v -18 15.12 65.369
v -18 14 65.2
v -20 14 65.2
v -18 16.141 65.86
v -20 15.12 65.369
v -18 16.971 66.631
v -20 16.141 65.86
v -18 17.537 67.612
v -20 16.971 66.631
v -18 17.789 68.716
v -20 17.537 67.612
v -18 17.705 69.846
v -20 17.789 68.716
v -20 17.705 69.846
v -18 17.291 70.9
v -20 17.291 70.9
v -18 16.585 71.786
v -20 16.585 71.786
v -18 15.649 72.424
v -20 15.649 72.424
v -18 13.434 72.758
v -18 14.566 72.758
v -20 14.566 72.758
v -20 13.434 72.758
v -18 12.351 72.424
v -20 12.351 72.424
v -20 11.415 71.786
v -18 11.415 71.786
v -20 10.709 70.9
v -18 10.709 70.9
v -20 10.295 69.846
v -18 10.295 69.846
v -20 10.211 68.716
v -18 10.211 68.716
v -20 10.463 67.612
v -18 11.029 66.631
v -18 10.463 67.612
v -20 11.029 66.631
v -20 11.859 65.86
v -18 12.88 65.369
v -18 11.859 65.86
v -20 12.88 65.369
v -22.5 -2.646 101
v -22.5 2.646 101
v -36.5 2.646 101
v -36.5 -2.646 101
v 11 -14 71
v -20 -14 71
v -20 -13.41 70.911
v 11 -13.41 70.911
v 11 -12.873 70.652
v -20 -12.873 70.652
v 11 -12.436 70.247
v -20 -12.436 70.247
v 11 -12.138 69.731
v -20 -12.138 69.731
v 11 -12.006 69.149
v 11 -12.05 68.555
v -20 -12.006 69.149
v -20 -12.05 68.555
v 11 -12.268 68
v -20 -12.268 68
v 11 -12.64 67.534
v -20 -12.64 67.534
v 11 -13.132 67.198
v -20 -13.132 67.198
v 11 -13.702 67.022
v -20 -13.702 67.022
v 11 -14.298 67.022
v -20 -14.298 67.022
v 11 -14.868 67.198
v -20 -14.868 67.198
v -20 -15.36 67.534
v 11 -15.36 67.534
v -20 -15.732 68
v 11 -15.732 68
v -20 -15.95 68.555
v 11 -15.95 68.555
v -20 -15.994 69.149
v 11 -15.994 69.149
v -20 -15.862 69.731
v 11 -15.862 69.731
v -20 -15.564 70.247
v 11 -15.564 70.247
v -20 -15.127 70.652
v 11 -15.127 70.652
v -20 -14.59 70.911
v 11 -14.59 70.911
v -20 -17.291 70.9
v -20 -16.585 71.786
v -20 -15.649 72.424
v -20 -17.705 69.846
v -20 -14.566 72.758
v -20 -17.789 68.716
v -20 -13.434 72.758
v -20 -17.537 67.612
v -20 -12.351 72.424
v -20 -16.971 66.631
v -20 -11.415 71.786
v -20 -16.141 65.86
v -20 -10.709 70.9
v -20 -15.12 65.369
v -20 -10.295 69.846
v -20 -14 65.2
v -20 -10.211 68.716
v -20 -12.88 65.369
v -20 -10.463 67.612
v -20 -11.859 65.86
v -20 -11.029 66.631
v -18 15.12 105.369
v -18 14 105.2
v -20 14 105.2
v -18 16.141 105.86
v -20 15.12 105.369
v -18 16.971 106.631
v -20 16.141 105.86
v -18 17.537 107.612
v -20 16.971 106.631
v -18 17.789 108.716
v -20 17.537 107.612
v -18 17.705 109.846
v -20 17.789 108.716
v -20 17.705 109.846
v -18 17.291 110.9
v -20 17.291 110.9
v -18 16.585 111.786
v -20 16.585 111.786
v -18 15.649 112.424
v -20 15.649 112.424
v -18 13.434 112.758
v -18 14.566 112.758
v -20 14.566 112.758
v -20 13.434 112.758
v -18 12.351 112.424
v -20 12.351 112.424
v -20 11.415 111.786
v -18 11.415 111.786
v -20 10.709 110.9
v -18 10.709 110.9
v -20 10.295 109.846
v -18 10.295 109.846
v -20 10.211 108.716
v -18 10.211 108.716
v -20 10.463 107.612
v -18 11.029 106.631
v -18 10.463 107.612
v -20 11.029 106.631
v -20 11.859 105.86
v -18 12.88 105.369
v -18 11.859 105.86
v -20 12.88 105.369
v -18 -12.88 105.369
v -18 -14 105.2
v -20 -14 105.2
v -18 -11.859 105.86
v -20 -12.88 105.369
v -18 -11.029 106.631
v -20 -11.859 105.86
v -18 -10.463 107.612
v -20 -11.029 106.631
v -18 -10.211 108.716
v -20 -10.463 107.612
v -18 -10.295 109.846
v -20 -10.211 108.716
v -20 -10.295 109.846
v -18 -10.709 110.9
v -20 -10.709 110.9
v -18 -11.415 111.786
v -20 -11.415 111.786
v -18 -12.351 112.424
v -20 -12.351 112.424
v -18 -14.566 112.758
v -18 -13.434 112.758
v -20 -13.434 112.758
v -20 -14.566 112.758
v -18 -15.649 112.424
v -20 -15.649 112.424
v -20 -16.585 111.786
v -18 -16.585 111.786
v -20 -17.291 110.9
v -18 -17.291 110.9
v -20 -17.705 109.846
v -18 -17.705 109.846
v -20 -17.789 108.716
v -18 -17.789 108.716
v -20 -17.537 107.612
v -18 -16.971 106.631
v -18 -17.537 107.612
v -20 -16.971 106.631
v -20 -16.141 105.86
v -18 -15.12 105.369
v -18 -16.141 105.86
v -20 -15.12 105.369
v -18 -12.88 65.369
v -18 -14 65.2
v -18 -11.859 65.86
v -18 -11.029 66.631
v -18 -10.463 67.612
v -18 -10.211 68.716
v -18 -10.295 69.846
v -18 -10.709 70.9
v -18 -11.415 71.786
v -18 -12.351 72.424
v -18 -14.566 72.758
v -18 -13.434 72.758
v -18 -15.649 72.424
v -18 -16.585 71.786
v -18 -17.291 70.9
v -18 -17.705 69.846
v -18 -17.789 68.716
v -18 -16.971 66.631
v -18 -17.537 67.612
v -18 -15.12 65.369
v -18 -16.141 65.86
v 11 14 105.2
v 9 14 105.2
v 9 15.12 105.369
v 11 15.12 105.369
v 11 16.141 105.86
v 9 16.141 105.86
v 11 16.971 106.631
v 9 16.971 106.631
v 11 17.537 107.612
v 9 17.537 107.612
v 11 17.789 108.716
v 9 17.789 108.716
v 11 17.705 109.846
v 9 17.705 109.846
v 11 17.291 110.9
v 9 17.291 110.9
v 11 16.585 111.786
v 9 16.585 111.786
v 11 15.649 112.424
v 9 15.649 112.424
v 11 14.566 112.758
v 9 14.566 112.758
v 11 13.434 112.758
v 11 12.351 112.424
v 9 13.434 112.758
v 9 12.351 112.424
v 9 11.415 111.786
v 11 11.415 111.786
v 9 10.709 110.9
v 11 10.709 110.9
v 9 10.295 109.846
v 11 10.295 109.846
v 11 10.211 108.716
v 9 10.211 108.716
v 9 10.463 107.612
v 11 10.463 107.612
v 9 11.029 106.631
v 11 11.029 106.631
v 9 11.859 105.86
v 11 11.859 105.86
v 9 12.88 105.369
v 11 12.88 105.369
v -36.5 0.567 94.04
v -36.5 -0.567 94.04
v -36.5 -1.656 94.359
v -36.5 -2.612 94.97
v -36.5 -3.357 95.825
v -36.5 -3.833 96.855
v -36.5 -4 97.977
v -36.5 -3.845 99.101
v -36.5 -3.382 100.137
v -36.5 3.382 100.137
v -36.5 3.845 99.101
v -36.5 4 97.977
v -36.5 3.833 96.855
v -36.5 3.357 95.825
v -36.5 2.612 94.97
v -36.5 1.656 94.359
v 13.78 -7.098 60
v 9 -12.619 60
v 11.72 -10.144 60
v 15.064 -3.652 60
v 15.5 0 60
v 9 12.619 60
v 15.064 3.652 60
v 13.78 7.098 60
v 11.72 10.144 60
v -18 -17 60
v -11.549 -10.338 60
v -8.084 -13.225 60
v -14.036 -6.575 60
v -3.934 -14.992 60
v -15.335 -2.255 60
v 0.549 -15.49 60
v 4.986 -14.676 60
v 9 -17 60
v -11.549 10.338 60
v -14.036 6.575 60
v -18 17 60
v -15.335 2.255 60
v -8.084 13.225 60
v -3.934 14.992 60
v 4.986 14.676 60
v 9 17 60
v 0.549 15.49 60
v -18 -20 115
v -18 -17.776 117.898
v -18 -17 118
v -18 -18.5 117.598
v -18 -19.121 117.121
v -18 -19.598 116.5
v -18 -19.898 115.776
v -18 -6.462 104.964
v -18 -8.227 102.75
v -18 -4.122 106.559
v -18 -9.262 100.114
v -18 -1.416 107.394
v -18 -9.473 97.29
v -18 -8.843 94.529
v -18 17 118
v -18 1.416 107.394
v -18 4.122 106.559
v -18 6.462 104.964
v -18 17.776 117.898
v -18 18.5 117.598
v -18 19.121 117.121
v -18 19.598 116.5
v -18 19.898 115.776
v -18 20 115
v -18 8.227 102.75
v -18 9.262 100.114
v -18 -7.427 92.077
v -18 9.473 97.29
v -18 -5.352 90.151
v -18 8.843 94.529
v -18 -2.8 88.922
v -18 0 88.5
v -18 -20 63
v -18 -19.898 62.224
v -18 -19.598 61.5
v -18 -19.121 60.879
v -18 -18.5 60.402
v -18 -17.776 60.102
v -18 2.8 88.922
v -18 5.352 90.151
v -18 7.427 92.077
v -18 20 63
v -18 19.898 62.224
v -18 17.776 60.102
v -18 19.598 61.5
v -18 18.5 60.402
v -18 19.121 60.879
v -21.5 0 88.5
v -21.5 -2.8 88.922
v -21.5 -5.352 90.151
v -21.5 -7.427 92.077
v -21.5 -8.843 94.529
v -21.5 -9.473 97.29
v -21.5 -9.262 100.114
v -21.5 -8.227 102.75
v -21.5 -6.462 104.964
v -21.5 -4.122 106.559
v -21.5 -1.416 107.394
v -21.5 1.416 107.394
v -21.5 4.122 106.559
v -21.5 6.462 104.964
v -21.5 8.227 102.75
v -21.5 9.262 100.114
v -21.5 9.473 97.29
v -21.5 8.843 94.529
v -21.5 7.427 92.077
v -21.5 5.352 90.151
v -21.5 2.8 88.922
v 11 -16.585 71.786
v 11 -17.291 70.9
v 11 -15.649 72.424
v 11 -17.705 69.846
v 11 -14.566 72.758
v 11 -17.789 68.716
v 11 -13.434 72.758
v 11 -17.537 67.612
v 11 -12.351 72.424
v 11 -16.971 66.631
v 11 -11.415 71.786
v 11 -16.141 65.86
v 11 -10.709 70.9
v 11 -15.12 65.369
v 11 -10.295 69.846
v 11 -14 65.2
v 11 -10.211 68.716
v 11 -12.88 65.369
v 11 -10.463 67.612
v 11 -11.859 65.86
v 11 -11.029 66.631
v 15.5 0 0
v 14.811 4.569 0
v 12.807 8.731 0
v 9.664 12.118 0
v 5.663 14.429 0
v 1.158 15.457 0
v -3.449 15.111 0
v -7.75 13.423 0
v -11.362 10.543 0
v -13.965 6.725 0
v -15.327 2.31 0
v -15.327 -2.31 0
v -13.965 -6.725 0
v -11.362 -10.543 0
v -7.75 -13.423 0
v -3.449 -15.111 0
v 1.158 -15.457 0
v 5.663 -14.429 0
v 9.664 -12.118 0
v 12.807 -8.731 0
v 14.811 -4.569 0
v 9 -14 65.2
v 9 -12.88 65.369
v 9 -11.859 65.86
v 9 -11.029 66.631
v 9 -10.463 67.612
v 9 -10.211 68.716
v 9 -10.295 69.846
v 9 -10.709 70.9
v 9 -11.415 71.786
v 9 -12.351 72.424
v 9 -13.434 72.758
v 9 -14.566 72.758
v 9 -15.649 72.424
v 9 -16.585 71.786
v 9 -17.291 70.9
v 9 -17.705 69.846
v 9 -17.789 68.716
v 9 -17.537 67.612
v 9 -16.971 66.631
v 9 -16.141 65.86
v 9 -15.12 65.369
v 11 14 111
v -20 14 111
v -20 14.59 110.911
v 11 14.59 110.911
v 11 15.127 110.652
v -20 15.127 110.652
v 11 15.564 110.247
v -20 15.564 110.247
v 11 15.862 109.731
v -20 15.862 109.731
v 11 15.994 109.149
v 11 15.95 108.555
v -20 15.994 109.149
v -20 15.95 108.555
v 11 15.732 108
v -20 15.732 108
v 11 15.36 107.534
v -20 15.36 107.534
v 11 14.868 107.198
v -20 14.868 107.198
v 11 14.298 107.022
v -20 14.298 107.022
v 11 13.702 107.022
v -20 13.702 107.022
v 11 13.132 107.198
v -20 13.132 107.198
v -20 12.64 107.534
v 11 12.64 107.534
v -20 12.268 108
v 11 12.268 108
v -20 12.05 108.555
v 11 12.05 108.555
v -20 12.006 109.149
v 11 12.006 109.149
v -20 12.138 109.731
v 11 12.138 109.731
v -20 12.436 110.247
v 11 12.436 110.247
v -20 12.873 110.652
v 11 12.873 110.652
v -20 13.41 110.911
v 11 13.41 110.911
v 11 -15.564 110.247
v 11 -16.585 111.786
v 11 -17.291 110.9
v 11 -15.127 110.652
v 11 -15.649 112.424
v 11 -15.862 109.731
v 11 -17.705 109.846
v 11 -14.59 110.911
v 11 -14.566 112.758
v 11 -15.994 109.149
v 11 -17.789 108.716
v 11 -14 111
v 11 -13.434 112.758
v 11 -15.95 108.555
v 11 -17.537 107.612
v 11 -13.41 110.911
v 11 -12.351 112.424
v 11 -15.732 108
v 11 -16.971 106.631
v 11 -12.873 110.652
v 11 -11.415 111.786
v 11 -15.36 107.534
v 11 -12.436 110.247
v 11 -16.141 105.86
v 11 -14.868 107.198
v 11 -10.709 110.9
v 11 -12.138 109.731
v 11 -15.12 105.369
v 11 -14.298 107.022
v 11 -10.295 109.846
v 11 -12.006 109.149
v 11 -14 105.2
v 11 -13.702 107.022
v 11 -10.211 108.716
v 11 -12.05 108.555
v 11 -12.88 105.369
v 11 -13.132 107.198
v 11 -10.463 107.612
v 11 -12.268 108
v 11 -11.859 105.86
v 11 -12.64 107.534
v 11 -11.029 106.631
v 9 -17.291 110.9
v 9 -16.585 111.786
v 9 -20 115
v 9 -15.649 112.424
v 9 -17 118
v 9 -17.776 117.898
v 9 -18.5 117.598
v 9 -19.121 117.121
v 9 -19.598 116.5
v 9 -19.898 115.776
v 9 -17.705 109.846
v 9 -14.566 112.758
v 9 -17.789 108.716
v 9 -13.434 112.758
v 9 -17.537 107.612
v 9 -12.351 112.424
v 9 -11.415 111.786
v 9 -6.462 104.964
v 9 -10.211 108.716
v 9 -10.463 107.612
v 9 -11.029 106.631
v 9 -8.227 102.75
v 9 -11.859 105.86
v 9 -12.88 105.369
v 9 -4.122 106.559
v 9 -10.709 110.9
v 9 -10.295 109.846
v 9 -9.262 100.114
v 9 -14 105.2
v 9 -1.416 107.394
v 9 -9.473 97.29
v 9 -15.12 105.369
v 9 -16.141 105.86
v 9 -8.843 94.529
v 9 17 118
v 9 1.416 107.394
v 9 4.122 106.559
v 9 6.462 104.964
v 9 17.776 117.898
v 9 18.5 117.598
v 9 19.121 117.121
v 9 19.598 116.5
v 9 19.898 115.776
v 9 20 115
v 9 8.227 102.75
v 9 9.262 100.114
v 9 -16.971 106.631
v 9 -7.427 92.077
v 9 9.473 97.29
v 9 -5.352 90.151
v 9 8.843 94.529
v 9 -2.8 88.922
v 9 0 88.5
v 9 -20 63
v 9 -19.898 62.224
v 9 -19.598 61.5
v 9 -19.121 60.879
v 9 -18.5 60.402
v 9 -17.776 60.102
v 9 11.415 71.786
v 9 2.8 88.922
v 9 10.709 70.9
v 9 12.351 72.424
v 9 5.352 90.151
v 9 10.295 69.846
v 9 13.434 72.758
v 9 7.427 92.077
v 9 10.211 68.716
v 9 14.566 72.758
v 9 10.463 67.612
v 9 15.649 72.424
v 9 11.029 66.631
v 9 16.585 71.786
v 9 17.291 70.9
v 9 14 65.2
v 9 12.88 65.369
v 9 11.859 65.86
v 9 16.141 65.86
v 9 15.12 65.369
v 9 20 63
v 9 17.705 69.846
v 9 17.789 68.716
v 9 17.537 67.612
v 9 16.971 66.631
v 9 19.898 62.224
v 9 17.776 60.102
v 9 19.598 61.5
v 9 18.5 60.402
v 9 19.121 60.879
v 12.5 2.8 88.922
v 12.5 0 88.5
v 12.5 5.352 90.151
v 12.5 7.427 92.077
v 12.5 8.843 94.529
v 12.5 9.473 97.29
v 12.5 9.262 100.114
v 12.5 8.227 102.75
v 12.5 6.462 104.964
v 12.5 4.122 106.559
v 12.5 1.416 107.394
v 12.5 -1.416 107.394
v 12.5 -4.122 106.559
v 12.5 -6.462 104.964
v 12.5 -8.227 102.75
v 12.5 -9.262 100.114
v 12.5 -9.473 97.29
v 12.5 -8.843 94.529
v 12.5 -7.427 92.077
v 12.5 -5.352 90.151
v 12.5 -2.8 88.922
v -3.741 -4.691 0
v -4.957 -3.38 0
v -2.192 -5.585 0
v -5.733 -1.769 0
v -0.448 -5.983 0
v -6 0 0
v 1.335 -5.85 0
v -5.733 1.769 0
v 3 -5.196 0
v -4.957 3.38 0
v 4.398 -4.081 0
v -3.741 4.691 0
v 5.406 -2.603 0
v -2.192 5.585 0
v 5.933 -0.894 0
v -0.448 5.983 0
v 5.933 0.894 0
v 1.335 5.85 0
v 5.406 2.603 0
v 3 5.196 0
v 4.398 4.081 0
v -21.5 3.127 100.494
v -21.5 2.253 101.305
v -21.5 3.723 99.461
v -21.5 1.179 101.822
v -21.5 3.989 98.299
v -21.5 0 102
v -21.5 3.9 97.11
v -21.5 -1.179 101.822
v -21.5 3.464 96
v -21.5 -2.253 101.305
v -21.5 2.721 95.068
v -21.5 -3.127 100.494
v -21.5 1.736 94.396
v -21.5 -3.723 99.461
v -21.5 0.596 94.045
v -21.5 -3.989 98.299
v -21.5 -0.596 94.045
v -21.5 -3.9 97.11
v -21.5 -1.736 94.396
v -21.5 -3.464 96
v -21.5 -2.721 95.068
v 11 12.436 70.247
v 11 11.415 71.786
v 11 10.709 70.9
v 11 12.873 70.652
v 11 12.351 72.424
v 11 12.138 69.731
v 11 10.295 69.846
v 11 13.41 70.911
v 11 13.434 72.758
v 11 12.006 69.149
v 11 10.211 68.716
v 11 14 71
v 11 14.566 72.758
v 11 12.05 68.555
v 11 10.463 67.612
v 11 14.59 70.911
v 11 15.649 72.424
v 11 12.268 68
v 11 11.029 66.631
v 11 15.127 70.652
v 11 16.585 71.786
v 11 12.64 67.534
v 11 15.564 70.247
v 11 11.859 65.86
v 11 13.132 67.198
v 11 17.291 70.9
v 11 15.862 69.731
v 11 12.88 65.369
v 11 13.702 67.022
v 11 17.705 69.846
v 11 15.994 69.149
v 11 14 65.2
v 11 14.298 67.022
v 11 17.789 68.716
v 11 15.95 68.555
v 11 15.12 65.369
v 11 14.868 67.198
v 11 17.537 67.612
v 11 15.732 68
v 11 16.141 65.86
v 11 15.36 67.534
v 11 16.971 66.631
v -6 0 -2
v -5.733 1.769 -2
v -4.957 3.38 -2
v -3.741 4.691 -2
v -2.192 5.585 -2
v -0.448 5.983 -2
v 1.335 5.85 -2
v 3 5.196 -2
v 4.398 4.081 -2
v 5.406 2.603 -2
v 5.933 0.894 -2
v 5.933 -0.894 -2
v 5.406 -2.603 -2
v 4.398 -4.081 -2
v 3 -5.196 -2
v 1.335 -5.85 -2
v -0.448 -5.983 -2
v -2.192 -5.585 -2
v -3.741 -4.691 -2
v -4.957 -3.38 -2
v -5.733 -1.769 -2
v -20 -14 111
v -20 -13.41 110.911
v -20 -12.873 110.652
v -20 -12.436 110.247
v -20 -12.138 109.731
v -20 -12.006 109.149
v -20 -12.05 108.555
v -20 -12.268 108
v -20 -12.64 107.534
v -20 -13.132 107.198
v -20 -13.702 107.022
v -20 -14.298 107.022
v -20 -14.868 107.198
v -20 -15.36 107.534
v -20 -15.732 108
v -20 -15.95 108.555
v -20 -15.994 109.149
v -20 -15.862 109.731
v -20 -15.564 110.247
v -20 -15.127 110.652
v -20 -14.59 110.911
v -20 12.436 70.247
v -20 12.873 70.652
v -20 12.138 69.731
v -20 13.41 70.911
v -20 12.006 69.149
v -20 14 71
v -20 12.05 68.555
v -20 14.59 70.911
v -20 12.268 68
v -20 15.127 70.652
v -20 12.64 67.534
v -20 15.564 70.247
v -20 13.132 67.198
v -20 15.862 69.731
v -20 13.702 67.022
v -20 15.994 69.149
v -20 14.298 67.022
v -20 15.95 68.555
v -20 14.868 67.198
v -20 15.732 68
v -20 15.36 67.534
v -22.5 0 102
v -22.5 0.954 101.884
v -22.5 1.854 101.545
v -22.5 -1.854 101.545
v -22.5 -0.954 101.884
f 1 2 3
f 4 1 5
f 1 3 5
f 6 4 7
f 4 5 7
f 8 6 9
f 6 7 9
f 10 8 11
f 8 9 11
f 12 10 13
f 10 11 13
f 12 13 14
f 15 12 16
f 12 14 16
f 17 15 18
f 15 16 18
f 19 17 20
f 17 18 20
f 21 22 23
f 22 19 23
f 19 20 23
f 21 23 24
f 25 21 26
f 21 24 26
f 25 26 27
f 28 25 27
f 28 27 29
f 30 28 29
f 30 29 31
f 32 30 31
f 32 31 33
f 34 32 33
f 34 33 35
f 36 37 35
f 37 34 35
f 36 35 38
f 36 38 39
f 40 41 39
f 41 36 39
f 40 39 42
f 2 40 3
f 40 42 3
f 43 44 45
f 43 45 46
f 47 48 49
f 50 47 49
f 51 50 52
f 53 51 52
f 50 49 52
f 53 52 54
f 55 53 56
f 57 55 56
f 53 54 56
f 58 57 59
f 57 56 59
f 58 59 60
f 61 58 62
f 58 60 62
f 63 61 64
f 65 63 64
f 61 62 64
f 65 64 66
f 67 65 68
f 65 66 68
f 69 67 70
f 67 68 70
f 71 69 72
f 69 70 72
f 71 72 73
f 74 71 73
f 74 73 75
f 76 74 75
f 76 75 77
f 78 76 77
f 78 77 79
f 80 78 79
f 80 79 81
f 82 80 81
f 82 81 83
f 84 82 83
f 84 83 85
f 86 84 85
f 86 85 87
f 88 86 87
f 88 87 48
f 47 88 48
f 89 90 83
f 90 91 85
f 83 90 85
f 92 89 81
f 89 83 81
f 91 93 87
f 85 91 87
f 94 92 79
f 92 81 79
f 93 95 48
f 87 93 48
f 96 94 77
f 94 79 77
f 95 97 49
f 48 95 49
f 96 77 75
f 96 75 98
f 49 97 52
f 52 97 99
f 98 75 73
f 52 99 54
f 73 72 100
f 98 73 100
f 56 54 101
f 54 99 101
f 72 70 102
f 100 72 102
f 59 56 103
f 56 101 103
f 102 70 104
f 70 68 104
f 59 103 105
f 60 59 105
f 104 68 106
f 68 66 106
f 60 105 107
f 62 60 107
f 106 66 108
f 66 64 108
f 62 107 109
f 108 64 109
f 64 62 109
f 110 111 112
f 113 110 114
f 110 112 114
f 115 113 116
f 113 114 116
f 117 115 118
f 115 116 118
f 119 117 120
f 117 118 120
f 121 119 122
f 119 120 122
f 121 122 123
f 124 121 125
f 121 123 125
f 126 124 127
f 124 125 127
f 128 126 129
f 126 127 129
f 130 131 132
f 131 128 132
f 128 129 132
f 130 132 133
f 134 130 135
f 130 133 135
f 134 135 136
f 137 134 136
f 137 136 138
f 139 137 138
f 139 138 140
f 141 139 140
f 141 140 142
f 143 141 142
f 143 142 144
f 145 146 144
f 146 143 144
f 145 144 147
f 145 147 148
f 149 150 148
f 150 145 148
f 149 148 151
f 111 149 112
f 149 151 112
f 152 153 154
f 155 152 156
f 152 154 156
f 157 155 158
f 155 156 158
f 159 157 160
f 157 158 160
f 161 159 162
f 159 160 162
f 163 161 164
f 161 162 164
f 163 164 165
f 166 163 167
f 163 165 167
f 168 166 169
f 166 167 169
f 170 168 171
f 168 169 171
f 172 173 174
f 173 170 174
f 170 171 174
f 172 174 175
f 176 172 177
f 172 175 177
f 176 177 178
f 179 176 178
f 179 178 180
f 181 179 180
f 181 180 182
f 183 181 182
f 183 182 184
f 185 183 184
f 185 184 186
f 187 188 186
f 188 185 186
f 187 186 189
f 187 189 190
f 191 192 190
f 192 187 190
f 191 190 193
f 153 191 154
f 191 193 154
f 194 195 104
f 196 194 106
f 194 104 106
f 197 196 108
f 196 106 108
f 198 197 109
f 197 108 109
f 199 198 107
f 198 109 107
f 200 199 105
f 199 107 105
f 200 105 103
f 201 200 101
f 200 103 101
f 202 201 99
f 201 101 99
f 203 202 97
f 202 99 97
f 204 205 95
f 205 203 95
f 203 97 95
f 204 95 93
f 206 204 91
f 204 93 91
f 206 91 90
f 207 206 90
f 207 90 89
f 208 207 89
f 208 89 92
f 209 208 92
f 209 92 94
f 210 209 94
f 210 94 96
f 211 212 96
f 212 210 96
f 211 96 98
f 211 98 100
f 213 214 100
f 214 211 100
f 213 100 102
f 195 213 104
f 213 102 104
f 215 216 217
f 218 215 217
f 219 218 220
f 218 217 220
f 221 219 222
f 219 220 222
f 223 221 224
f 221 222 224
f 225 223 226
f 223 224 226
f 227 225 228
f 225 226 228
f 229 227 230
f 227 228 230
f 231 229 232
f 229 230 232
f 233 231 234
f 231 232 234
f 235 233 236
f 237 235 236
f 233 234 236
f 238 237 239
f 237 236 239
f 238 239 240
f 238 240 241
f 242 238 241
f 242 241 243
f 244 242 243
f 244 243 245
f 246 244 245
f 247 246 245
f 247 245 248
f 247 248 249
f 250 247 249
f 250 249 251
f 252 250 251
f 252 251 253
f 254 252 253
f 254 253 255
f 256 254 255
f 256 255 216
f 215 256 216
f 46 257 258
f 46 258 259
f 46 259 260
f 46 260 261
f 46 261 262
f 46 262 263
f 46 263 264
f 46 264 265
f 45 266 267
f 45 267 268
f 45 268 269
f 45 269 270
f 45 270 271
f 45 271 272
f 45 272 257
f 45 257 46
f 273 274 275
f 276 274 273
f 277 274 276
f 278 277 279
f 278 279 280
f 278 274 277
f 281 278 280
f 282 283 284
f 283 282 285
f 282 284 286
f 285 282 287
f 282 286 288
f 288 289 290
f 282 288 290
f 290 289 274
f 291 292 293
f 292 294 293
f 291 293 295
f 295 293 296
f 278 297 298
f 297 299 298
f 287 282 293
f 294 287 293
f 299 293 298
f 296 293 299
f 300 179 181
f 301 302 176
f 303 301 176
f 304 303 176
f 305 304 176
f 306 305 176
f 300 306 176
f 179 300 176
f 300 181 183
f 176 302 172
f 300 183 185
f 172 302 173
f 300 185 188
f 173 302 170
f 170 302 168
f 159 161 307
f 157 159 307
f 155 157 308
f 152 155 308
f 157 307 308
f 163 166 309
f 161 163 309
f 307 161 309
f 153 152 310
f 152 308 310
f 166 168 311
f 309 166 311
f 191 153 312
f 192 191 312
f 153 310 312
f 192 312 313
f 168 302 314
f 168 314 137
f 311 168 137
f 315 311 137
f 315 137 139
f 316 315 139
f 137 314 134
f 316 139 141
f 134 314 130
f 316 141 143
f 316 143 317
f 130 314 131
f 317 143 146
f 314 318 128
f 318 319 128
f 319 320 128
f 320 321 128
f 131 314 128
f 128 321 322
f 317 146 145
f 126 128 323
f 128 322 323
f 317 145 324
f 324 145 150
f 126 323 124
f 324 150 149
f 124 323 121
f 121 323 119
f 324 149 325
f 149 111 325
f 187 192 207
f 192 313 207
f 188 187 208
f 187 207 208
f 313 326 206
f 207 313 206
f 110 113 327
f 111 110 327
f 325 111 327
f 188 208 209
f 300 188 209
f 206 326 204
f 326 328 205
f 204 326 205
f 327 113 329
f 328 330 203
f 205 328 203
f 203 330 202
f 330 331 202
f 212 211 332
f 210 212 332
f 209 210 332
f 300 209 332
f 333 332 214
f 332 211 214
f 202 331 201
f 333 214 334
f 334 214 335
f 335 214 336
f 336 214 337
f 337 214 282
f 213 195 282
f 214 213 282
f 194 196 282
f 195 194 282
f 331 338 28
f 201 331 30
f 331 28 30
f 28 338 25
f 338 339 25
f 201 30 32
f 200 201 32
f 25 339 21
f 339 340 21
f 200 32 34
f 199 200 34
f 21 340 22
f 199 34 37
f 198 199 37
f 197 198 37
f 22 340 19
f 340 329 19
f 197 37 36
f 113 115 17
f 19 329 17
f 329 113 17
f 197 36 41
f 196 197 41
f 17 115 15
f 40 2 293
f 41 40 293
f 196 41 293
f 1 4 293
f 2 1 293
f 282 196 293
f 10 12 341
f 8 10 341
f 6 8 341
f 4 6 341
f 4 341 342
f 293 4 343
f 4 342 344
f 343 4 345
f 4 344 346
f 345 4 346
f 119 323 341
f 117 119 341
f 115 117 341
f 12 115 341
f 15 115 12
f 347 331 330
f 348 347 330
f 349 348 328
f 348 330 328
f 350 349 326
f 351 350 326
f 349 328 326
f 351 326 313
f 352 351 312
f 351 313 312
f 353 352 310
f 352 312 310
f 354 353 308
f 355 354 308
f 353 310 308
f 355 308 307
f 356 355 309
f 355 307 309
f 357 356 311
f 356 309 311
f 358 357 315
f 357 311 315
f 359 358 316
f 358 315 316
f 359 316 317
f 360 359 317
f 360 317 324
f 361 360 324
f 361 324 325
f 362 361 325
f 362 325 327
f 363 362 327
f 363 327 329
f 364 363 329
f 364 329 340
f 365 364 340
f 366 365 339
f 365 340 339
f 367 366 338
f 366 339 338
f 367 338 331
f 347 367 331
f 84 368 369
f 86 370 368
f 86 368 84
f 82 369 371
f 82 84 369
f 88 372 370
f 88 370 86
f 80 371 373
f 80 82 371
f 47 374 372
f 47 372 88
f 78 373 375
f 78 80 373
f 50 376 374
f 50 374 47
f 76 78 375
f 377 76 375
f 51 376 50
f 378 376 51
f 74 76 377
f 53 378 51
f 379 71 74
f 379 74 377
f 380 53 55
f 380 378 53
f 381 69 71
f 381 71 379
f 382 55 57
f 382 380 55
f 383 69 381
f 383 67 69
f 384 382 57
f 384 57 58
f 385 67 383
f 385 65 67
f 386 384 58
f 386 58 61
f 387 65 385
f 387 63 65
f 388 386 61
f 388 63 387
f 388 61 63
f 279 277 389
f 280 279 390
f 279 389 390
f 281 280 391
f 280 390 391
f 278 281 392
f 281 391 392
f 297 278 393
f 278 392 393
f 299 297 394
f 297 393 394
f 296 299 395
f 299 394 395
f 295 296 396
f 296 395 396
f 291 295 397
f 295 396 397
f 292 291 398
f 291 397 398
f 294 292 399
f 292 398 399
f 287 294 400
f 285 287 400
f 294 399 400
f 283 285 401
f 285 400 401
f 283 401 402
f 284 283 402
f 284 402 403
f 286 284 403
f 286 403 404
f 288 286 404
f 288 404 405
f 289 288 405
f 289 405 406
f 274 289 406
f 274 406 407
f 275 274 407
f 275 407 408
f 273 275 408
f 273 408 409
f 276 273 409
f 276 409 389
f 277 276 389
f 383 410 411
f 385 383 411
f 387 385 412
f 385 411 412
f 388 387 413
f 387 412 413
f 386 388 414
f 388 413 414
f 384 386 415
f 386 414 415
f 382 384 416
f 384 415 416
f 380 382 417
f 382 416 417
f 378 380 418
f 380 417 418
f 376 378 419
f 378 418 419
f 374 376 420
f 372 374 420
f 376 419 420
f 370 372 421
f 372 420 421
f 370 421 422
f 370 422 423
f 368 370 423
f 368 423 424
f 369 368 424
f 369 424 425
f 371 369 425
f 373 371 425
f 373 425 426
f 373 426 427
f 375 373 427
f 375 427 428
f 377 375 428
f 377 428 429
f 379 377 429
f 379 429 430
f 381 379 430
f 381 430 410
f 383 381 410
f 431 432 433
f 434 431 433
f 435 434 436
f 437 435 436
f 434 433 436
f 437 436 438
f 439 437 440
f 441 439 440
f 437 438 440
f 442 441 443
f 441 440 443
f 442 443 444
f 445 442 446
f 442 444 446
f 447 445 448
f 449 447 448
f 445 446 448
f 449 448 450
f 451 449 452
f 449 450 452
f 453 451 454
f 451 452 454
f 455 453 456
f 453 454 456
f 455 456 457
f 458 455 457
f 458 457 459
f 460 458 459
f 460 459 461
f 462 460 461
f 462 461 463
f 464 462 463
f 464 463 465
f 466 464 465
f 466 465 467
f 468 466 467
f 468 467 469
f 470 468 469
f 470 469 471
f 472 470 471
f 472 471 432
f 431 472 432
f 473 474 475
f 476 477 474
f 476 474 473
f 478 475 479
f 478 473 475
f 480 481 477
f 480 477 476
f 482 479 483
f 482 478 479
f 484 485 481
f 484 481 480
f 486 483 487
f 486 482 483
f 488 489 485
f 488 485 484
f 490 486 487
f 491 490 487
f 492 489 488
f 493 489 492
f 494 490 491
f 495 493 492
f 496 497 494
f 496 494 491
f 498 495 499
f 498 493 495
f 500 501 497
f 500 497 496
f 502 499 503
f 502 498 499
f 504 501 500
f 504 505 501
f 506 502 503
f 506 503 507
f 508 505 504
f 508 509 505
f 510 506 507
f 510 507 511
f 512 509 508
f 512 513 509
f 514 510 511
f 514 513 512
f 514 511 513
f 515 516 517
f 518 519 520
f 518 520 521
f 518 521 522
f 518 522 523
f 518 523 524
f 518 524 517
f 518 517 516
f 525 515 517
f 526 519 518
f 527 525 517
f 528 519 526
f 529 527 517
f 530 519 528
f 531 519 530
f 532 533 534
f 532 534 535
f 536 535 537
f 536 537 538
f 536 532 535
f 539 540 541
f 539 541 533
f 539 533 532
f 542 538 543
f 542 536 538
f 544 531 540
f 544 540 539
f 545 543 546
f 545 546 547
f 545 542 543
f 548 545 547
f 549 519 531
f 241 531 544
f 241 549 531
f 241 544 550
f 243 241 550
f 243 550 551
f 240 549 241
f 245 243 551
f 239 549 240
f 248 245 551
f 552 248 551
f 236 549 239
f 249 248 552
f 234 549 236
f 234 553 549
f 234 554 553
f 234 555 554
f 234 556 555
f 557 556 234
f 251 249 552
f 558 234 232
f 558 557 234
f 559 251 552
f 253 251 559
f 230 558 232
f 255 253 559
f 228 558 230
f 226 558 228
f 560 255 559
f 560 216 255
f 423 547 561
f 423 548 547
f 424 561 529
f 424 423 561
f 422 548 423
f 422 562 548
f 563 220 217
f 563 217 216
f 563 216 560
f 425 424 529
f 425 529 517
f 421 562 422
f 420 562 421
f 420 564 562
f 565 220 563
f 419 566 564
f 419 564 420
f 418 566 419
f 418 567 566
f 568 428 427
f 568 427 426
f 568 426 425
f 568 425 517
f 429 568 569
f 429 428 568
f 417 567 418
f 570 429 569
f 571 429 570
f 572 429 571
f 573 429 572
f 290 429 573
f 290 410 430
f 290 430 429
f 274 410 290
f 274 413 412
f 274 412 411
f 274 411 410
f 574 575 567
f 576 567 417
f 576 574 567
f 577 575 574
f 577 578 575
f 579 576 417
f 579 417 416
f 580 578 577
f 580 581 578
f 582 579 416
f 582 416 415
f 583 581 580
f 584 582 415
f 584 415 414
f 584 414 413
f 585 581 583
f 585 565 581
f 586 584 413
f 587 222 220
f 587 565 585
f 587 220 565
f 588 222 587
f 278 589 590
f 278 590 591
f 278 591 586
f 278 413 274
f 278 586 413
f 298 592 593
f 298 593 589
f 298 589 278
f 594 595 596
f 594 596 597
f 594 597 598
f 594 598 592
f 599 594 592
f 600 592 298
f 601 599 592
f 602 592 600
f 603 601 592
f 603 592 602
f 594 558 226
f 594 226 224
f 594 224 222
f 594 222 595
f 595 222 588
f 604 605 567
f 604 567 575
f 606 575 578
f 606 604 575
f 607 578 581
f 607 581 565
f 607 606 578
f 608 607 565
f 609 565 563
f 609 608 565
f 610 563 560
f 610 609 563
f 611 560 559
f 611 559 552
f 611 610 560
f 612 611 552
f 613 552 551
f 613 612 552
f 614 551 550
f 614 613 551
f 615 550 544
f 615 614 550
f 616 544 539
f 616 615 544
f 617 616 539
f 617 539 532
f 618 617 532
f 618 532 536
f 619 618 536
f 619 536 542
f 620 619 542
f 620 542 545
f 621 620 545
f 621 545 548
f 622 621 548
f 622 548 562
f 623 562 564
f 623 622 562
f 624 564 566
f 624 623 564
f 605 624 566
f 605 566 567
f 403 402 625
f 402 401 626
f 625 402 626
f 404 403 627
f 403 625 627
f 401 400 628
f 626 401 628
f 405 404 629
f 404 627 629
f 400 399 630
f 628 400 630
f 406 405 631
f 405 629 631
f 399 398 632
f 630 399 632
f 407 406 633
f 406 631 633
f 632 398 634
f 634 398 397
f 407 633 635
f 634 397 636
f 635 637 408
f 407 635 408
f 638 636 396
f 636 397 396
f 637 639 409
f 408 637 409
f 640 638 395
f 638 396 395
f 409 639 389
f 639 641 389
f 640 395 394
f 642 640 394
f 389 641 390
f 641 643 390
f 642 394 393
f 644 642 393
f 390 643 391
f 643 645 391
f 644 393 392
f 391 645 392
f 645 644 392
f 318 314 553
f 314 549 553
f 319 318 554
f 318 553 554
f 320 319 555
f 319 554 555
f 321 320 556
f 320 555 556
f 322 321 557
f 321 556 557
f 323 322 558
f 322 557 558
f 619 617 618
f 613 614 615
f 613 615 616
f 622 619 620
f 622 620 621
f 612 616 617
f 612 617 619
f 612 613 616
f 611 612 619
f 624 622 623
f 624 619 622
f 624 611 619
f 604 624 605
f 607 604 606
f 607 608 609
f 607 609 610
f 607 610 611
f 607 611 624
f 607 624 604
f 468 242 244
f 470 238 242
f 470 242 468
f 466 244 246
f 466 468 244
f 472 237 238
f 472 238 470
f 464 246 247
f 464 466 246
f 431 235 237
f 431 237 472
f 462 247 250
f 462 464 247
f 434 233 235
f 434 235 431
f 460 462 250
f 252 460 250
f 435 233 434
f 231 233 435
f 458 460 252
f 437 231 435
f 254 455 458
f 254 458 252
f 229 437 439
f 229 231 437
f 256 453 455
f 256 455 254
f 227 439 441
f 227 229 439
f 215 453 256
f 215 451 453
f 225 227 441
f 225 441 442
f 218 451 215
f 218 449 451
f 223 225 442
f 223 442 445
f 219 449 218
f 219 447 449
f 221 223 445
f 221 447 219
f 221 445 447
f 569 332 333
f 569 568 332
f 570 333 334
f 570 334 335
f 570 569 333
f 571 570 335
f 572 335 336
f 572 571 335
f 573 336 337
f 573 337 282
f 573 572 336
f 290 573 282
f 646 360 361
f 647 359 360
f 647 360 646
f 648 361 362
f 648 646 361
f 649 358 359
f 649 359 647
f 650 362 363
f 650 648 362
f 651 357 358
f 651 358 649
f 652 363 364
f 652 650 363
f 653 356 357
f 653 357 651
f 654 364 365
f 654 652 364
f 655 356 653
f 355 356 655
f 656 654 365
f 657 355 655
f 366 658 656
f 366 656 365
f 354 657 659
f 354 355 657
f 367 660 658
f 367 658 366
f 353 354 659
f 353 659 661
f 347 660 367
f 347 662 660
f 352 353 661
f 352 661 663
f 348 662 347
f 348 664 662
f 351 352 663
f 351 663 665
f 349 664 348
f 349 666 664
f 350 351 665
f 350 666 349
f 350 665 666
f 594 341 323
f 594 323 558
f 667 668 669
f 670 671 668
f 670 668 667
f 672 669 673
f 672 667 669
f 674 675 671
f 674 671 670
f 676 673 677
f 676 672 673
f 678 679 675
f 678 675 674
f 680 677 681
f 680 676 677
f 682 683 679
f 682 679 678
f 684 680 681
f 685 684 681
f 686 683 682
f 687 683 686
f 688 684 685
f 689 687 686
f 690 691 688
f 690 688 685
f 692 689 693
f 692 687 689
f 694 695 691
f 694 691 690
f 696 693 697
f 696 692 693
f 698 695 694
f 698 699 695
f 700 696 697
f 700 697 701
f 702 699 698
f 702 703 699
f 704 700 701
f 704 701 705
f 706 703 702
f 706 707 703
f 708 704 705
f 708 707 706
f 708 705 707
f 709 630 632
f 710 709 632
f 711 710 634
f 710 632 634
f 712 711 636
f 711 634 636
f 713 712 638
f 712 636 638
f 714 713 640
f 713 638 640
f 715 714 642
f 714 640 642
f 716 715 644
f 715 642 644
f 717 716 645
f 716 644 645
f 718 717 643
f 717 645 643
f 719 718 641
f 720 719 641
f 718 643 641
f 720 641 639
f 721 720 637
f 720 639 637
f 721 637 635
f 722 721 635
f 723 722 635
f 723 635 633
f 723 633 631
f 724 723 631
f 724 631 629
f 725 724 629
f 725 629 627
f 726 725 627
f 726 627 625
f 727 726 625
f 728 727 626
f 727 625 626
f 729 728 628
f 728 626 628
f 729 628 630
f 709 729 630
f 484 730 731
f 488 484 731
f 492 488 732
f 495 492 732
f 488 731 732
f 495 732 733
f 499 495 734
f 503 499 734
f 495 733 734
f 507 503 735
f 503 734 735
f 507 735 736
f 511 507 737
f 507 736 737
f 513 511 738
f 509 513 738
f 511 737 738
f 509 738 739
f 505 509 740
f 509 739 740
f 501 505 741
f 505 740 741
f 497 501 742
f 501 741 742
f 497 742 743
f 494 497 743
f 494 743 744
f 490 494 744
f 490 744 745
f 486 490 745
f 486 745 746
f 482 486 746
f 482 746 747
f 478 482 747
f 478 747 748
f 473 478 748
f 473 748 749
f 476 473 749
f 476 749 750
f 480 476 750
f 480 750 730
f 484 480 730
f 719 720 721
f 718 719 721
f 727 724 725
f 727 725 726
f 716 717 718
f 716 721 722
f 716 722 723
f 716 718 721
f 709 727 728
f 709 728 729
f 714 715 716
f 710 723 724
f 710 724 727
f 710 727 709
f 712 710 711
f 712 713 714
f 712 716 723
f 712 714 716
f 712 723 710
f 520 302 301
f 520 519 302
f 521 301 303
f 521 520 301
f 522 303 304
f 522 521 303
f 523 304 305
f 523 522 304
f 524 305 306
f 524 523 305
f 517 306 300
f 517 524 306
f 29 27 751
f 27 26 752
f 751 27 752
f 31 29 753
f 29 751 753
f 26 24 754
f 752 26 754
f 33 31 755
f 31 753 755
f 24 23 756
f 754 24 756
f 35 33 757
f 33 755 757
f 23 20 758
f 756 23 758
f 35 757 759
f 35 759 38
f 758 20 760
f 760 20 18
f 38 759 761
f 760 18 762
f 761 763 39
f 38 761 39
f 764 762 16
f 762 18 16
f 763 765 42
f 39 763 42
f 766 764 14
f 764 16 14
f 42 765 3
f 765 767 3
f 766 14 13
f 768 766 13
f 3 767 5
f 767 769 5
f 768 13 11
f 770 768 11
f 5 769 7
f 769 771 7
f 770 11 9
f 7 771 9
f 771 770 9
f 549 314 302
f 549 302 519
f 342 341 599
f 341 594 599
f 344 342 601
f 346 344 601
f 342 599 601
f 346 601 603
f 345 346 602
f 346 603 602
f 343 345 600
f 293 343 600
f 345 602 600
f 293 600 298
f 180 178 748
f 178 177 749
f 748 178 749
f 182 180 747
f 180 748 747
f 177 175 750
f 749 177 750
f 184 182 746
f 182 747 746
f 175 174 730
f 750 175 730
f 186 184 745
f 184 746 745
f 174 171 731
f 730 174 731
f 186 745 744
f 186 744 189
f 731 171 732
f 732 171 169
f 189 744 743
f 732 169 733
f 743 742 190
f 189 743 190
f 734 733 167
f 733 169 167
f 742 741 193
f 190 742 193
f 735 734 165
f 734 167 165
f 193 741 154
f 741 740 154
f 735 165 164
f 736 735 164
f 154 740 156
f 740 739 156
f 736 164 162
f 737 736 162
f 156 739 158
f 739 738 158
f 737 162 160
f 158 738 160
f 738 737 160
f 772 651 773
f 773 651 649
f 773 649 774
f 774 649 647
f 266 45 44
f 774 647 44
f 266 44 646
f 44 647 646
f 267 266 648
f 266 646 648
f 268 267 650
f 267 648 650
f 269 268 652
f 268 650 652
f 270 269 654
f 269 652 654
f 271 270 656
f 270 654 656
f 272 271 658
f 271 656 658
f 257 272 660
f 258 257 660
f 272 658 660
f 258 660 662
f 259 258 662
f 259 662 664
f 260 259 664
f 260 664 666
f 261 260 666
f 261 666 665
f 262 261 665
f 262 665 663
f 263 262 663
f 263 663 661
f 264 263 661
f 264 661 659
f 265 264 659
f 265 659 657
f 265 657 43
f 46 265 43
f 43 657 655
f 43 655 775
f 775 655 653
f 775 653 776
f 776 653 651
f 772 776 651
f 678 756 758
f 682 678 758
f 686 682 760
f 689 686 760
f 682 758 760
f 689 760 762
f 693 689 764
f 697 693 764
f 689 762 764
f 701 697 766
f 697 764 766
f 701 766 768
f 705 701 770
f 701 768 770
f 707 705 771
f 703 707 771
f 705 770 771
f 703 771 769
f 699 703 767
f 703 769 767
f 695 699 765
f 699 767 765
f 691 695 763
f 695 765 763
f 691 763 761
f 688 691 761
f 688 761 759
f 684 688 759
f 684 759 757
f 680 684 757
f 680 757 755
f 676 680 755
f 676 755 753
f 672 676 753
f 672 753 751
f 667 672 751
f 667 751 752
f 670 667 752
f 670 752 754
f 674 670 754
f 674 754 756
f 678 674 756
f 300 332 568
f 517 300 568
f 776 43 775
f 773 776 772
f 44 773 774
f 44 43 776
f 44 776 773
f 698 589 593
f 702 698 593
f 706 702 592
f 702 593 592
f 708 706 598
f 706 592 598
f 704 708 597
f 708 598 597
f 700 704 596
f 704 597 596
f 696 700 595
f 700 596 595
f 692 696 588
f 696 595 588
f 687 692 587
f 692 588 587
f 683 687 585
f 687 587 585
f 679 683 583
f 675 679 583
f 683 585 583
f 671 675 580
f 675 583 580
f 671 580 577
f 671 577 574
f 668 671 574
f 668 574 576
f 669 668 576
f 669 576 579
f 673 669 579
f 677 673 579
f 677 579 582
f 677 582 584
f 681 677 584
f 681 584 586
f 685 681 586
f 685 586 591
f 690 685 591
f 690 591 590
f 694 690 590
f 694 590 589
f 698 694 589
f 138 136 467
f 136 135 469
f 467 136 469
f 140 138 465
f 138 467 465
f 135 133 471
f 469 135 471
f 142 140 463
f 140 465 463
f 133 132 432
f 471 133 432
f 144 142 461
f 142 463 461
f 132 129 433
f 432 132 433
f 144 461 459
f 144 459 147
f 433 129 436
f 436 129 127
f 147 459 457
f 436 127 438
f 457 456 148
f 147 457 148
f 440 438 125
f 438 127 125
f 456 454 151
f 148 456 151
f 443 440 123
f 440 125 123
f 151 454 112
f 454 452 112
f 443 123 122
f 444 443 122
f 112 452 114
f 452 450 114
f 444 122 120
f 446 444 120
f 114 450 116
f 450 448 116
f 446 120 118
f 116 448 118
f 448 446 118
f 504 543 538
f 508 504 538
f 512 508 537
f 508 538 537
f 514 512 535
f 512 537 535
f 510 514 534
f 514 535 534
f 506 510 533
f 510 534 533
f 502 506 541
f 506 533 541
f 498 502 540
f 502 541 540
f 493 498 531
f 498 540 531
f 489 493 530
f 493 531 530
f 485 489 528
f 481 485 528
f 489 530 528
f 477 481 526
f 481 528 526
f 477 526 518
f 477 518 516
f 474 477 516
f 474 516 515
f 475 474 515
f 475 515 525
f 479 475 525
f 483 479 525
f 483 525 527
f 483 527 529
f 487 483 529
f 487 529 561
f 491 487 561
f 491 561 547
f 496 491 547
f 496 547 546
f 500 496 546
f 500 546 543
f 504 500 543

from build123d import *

# Parameters (mm, degrees)
SKETCH1_R                = 15.5
BOSS_EXTRUDE1_DEPTH      = 60
SKETCH2_R                = 6
BOSS_EXTRUDE2_DEPTH      = 2
SKETCH3_W                = 27
SKETCH3_H                = 58
BOSS_EXTRUDE3_DEPTH      = 20
SKETCH4_R                = 9.5
BOSS_EXTRUDE4_DEPTH      = 3.5
BOSS_EXTRUDE5_START      = 3.5
SKETCH6_R                = 9.5
BOSS_EXTRUDE5_DEPTH      = 3.5
SKETCH7_R                = 4
BOSS_EXTRUDE6_DEPTH      = 15
CUT_EXTRUDE1_START       = -14
CUT_EXTRUDE1_DEPTH       = 14
BOSS_EXTRUDE7_DEPTH      = 2
BOSS_EXTRUDE7_DEPTH_BACK = 29
SKETCH10_R               = 3.8
F_4_0MM_DOWEL_HOLE1_D    = 4
FILLET1_R                = 3


with BuildPart() as part:
    # Sketch1 → Boss-Extrude1 (new body)
    with BuildSketch(Plane.XY):
        Circle(SKETCH1_R)
    extrude(amount=BOSS_EXTRUDE1_DEPTH)

    # Sketch2 → Boss-Extrude2 (add)
    with BuildSketch(Plane(origin=(0, 0, 0), x_dir=(-1, 0, 0), z_dir=(0, 0, -1))):
        Circle(SKETCH2_R)
    extrude(amount=BOSS_EXTRUDE2_DEPTH)

    # Sketch3 → Boss-Extrude3 (add, symmetric)
    with BuildSketch(Plane(origin=(0, 0, 0), x_dir=(1, 0, 0), z_dir=(0, 1, 0))):
        with Locations((-4.5, -89)):
            Rectangle(SKETCH3_W, SKETCH3_H)
    extrude(amount=BOSS_EXTRUDE3_DEPTH, both=True)

    # Sketch4 → Boss-Extrude4 (add)
    with BuildSketch(Plane.ZY.offset(18)):
        with Locations(Location((98, 0, 0), (0, 0, 180))):
            Circle(SKETCH4_R)
    extrude(amount=BOSS_EXTRUDE4_DEPTH)

    # Sketch6 → Boss-Extrude5 (add)
    with BuildSketch(Plane(origin=(9, 0, 0), x_dir=(0, 0, -1), z_dir=(1, 0, 0)).offset(BOSS_EXTRUDE5_START)):
        with Locations((-98, 0)):
            Circle(SKETCH6_R)
    extrude(amount=-BOSS_EXTRUDE5_DEPTH)

    # Sketch7 → Boss-Extrude6 (add)
    with BuildSketch(Plane.ZY.offset(21.5)):
        with Locations((98, 0)):
            Circle(SKETCH7_R)
    extrude(amount=BOSS_EXTRUDE6_DEPTH)

    # Sketch8 → Cut-Extrude1 (cut)
    with BuildSketch(Plane.ZY.offset(36.5).offset(CUT_EXTRUDE1_START)):
        with BuildLine():
            Line((101, 2.645751311), (101, -2.645751311))
            ThreePointArc((101, -2.645751311), (102, 0), (101, 2.645751311))
        make_face()
    extrude(amount=CUT_EXTRUDE1_DEPTH, mode=Mode.SUBTRACT)

    # Sketch10 → Boss-Extrude7 (add, two sides: drawn at the far end of the back side and taken through both)
    with BuildSketch(Plane(origin=(9, 0, 0), x_dir=(0, 0, -1), z_dir=(1, 0, 0)).offset(-BOSS_EXTRUDE7_DEPTH_BACK)):
        with Locations((-69, 14)):
            Circle(SKETCH10_R)
        with Locations((-109, 14)):
            Circle(SKETCH10_R)
        with Locations((-69, -14)):
            Circle(SKETCH10_R)
        with Locations((-109, -14)):
            Circle(SKETCH10_R)
    extrude(amount=BOSS_EXTRUDE7_DEPTH + BOSS_EXTRUDE7_DEPTH_BACK)

    # Ø4.0mm Dowel Hole1 (through all)
    with Locations(Plane(origin=(11, 0, 0), x_dir=(0, 0, -1), z_dir=(1, 0, 0))):
        with Locations((-109, 14), (-69, 14), (-69, -14), (-109, -14)):
            Hole(F_4_0MM_DOWEL_HOLE1_D / 2)

    # Fillet1
    fillet1_edges = [part.edges().sort_by_distance(p)[0] for p in [
        (-4.5, -20, 60),
        (-4.5, -20, 118),
        (-4.5, 20, 60),
        (-4.5, 20, 118),
    ]]
    fillet(fillet1_edges, radius=FILLET1_R)


solid = part.part
